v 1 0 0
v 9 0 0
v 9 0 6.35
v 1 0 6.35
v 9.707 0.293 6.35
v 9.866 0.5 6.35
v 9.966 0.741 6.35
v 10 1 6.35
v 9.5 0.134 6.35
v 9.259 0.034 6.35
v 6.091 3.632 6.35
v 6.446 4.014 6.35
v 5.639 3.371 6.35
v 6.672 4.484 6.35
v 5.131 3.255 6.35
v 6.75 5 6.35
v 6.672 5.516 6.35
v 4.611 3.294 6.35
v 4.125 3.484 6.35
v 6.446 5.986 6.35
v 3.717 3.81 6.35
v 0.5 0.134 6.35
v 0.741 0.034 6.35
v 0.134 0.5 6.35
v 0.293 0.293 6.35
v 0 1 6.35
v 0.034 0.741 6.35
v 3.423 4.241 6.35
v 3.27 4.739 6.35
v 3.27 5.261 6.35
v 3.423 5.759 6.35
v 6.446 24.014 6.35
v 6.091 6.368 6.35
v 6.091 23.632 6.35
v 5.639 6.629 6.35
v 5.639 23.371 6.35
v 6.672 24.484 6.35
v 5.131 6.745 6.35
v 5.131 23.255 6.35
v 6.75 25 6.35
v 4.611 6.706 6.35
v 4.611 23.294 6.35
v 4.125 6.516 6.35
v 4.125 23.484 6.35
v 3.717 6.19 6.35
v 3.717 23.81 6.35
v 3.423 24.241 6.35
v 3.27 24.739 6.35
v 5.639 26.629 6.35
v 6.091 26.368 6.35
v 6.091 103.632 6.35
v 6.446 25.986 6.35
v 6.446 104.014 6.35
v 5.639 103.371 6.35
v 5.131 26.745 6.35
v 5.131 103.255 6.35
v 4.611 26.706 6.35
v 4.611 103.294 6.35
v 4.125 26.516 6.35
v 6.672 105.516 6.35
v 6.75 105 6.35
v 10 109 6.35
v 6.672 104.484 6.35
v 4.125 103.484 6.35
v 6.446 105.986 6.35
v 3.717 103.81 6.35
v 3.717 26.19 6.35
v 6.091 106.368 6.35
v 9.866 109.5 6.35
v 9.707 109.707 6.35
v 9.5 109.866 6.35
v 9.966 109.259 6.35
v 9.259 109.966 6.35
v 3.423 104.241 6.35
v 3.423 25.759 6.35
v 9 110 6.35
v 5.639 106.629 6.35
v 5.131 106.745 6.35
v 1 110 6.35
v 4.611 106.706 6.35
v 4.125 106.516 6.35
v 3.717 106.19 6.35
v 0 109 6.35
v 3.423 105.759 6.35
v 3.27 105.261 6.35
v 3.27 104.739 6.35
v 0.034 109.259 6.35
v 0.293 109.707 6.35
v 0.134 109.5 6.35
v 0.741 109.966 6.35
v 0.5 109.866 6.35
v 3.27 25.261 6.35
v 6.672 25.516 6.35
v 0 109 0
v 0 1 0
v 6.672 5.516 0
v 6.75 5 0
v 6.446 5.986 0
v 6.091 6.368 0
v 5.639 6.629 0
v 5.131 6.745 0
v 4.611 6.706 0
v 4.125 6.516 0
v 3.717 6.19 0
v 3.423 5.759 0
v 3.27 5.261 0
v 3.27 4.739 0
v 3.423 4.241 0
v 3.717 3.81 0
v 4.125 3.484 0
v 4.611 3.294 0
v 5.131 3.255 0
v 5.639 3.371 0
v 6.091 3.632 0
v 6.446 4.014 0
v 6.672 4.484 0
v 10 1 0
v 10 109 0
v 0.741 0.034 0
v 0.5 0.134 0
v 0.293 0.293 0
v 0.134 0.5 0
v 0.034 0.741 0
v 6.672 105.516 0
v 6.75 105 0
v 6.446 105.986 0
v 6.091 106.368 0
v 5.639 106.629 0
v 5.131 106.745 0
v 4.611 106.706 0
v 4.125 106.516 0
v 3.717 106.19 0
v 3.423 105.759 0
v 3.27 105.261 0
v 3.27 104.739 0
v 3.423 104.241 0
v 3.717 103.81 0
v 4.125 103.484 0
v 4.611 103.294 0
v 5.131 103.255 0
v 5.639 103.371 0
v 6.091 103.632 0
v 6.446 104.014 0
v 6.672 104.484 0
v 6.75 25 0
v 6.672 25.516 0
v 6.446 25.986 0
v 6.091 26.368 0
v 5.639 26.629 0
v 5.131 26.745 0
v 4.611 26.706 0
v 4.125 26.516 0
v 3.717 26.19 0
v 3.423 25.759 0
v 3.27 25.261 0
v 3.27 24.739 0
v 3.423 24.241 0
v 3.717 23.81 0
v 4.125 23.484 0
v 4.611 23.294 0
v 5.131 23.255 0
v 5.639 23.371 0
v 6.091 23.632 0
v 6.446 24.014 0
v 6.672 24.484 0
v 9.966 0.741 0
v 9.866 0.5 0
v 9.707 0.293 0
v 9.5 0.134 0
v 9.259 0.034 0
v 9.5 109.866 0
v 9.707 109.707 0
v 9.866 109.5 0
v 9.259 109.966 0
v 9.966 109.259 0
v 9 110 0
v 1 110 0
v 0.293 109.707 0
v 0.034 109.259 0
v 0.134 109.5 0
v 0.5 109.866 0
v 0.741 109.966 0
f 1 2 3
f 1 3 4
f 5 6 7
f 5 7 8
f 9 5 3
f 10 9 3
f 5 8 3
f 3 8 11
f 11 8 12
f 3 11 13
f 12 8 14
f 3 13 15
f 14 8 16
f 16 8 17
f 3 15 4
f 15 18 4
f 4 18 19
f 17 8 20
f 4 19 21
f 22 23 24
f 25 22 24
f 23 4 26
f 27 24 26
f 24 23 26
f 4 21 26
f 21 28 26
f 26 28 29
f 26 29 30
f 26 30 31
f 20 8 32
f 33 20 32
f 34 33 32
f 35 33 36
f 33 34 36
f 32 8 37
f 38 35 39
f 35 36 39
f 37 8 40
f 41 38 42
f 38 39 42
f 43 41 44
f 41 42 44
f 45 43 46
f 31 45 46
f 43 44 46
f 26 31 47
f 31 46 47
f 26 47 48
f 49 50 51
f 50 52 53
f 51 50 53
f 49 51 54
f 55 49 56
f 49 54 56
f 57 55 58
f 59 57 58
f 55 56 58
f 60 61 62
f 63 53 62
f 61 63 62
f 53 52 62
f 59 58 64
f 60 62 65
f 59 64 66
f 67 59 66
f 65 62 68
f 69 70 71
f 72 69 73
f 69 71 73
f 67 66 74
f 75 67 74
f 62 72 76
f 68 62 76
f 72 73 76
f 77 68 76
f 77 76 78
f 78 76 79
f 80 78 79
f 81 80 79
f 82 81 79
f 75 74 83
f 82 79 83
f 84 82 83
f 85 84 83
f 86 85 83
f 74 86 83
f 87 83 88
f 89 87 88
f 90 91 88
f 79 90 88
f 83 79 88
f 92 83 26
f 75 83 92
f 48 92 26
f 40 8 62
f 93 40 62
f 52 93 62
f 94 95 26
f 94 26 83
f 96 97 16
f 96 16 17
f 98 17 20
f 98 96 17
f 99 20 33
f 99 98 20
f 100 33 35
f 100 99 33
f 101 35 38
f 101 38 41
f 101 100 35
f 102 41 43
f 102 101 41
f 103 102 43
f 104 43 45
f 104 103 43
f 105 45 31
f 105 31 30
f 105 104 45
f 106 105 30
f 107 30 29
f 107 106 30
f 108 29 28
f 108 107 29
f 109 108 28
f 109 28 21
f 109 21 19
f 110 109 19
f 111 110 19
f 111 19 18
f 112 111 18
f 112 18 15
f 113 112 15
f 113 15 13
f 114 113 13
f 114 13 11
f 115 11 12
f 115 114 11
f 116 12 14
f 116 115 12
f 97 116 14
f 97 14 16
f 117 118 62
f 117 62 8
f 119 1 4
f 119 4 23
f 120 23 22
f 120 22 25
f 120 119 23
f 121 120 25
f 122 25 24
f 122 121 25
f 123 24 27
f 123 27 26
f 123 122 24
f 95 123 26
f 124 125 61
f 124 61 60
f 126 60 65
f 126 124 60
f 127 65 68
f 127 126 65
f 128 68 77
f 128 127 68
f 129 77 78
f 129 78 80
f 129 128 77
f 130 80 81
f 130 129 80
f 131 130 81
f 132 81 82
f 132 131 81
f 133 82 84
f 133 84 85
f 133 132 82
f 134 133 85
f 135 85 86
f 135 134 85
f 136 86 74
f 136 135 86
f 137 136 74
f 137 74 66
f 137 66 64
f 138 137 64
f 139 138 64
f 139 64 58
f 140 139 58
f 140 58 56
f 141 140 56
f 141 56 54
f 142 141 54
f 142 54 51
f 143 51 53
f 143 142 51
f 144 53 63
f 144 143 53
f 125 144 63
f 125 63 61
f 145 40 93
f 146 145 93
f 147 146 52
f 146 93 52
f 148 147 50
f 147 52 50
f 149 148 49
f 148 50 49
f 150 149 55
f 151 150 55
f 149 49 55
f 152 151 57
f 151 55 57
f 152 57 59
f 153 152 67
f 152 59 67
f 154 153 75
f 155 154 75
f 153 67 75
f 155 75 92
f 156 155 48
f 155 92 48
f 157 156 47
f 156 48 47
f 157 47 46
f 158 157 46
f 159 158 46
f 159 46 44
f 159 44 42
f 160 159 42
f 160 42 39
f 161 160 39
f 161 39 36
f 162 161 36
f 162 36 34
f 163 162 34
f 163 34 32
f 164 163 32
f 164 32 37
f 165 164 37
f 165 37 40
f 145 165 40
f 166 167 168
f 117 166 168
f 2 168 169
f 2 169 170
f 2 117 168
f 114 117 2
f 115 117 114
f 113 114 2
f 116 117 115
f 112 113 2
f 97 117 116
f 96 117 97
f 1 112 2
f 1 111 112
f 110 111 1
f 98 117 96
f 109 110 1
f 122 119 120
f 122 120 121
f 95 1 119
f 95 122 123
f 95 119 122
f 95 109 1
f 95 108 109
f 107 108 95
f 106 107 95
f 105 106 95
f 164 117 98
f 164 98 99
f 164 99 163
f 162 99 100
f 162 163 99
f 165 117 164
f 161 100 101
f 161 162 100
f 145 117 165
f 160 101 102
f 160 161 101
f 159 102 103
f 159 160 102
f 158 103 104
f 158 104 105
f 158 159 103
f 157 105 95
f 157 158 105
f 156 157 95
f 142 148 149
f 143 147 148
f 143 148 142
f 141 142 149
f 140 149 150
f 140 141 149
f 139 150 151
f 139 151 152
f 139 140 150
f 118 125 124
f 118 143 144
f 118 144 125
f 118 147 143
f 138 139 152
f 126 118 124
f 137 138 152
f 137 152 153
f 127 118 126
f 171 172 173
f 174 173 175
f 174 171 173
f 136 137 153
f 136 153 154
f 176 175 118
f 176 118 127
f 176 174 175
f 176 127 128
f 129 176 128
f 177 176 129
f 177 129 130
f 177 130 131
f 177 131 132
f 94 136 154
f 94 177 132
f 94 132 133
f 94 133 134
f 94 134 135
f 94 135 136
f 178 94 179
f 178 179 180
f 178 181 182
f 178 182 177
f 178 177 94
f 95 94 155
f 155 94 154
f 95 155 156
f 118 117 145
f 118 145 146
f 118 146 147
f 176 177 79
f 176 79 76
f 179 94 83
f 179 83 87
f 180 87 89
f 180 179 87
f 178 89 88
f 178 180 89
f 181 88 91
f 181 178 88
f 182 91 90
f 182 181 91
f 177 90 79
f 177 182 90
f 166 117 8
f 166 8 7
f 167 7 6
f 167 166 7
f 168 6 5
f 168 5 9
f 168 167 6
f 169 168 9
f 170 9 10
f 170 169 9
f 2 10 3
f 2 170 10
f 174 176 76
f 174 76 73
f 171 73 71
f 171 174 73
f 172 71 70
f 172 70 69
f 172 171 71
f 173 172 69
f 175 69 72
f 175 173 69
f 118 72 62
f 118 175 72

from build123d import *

# Parameters (mm, degrees)
SKETCH1_R           = 1.75
BOSS_EXTRUDE1_DEPTH = 6.35
SKETCH2_R           = 1.75
CUT_EXTRUDE1_DEPTH  = 10


with BuildPart() as part:
    # Sketch1 → Boss-Extrude1 (new body)
    with BuildSketch(Plane.XY):
        with BuildLine():
            Line((0, 1), (0, 109))
            ThreePointArc((0, 109), (0.292893219, 109.707106781), (1, 110))
            Line((1, 110), (9, 110))
            ThreePointArc((9, 110), (9.707106781, 109.707106781), (10, 109))
            Line((10, 109), (10, 1))
            ThreePointArc((10, 1), (9.707106781, 0.292893219), (9, 0))
            Line((9, 0), (1, 0))
            ThreePointArc((1, 0), (0.292893219, 0.292893219), (0, 1))
        make_face()
        with Locations((5, 105)):
            Circle(SKETCH1_R, mode=Mode.SUBTRACT)
        with Locations((5, 5)):
            Circle(SKETCH1_R, mode=Mode.SUBTRACT)
    extrude(amount=BOSS_EXTRUDE1_DEPTH)

    # Sketch2 → Cut-Extrude1 (cut)
    with BuildSketch(Plane.XY.offset(6.35)):
        with Locations((5, 25)):
            Circle(SKETCH2_R)
    extrude(amount=-CUT_EXTRUDE1_DEPTH, mode=Mode.SUBTRACT)


solid = part.part
